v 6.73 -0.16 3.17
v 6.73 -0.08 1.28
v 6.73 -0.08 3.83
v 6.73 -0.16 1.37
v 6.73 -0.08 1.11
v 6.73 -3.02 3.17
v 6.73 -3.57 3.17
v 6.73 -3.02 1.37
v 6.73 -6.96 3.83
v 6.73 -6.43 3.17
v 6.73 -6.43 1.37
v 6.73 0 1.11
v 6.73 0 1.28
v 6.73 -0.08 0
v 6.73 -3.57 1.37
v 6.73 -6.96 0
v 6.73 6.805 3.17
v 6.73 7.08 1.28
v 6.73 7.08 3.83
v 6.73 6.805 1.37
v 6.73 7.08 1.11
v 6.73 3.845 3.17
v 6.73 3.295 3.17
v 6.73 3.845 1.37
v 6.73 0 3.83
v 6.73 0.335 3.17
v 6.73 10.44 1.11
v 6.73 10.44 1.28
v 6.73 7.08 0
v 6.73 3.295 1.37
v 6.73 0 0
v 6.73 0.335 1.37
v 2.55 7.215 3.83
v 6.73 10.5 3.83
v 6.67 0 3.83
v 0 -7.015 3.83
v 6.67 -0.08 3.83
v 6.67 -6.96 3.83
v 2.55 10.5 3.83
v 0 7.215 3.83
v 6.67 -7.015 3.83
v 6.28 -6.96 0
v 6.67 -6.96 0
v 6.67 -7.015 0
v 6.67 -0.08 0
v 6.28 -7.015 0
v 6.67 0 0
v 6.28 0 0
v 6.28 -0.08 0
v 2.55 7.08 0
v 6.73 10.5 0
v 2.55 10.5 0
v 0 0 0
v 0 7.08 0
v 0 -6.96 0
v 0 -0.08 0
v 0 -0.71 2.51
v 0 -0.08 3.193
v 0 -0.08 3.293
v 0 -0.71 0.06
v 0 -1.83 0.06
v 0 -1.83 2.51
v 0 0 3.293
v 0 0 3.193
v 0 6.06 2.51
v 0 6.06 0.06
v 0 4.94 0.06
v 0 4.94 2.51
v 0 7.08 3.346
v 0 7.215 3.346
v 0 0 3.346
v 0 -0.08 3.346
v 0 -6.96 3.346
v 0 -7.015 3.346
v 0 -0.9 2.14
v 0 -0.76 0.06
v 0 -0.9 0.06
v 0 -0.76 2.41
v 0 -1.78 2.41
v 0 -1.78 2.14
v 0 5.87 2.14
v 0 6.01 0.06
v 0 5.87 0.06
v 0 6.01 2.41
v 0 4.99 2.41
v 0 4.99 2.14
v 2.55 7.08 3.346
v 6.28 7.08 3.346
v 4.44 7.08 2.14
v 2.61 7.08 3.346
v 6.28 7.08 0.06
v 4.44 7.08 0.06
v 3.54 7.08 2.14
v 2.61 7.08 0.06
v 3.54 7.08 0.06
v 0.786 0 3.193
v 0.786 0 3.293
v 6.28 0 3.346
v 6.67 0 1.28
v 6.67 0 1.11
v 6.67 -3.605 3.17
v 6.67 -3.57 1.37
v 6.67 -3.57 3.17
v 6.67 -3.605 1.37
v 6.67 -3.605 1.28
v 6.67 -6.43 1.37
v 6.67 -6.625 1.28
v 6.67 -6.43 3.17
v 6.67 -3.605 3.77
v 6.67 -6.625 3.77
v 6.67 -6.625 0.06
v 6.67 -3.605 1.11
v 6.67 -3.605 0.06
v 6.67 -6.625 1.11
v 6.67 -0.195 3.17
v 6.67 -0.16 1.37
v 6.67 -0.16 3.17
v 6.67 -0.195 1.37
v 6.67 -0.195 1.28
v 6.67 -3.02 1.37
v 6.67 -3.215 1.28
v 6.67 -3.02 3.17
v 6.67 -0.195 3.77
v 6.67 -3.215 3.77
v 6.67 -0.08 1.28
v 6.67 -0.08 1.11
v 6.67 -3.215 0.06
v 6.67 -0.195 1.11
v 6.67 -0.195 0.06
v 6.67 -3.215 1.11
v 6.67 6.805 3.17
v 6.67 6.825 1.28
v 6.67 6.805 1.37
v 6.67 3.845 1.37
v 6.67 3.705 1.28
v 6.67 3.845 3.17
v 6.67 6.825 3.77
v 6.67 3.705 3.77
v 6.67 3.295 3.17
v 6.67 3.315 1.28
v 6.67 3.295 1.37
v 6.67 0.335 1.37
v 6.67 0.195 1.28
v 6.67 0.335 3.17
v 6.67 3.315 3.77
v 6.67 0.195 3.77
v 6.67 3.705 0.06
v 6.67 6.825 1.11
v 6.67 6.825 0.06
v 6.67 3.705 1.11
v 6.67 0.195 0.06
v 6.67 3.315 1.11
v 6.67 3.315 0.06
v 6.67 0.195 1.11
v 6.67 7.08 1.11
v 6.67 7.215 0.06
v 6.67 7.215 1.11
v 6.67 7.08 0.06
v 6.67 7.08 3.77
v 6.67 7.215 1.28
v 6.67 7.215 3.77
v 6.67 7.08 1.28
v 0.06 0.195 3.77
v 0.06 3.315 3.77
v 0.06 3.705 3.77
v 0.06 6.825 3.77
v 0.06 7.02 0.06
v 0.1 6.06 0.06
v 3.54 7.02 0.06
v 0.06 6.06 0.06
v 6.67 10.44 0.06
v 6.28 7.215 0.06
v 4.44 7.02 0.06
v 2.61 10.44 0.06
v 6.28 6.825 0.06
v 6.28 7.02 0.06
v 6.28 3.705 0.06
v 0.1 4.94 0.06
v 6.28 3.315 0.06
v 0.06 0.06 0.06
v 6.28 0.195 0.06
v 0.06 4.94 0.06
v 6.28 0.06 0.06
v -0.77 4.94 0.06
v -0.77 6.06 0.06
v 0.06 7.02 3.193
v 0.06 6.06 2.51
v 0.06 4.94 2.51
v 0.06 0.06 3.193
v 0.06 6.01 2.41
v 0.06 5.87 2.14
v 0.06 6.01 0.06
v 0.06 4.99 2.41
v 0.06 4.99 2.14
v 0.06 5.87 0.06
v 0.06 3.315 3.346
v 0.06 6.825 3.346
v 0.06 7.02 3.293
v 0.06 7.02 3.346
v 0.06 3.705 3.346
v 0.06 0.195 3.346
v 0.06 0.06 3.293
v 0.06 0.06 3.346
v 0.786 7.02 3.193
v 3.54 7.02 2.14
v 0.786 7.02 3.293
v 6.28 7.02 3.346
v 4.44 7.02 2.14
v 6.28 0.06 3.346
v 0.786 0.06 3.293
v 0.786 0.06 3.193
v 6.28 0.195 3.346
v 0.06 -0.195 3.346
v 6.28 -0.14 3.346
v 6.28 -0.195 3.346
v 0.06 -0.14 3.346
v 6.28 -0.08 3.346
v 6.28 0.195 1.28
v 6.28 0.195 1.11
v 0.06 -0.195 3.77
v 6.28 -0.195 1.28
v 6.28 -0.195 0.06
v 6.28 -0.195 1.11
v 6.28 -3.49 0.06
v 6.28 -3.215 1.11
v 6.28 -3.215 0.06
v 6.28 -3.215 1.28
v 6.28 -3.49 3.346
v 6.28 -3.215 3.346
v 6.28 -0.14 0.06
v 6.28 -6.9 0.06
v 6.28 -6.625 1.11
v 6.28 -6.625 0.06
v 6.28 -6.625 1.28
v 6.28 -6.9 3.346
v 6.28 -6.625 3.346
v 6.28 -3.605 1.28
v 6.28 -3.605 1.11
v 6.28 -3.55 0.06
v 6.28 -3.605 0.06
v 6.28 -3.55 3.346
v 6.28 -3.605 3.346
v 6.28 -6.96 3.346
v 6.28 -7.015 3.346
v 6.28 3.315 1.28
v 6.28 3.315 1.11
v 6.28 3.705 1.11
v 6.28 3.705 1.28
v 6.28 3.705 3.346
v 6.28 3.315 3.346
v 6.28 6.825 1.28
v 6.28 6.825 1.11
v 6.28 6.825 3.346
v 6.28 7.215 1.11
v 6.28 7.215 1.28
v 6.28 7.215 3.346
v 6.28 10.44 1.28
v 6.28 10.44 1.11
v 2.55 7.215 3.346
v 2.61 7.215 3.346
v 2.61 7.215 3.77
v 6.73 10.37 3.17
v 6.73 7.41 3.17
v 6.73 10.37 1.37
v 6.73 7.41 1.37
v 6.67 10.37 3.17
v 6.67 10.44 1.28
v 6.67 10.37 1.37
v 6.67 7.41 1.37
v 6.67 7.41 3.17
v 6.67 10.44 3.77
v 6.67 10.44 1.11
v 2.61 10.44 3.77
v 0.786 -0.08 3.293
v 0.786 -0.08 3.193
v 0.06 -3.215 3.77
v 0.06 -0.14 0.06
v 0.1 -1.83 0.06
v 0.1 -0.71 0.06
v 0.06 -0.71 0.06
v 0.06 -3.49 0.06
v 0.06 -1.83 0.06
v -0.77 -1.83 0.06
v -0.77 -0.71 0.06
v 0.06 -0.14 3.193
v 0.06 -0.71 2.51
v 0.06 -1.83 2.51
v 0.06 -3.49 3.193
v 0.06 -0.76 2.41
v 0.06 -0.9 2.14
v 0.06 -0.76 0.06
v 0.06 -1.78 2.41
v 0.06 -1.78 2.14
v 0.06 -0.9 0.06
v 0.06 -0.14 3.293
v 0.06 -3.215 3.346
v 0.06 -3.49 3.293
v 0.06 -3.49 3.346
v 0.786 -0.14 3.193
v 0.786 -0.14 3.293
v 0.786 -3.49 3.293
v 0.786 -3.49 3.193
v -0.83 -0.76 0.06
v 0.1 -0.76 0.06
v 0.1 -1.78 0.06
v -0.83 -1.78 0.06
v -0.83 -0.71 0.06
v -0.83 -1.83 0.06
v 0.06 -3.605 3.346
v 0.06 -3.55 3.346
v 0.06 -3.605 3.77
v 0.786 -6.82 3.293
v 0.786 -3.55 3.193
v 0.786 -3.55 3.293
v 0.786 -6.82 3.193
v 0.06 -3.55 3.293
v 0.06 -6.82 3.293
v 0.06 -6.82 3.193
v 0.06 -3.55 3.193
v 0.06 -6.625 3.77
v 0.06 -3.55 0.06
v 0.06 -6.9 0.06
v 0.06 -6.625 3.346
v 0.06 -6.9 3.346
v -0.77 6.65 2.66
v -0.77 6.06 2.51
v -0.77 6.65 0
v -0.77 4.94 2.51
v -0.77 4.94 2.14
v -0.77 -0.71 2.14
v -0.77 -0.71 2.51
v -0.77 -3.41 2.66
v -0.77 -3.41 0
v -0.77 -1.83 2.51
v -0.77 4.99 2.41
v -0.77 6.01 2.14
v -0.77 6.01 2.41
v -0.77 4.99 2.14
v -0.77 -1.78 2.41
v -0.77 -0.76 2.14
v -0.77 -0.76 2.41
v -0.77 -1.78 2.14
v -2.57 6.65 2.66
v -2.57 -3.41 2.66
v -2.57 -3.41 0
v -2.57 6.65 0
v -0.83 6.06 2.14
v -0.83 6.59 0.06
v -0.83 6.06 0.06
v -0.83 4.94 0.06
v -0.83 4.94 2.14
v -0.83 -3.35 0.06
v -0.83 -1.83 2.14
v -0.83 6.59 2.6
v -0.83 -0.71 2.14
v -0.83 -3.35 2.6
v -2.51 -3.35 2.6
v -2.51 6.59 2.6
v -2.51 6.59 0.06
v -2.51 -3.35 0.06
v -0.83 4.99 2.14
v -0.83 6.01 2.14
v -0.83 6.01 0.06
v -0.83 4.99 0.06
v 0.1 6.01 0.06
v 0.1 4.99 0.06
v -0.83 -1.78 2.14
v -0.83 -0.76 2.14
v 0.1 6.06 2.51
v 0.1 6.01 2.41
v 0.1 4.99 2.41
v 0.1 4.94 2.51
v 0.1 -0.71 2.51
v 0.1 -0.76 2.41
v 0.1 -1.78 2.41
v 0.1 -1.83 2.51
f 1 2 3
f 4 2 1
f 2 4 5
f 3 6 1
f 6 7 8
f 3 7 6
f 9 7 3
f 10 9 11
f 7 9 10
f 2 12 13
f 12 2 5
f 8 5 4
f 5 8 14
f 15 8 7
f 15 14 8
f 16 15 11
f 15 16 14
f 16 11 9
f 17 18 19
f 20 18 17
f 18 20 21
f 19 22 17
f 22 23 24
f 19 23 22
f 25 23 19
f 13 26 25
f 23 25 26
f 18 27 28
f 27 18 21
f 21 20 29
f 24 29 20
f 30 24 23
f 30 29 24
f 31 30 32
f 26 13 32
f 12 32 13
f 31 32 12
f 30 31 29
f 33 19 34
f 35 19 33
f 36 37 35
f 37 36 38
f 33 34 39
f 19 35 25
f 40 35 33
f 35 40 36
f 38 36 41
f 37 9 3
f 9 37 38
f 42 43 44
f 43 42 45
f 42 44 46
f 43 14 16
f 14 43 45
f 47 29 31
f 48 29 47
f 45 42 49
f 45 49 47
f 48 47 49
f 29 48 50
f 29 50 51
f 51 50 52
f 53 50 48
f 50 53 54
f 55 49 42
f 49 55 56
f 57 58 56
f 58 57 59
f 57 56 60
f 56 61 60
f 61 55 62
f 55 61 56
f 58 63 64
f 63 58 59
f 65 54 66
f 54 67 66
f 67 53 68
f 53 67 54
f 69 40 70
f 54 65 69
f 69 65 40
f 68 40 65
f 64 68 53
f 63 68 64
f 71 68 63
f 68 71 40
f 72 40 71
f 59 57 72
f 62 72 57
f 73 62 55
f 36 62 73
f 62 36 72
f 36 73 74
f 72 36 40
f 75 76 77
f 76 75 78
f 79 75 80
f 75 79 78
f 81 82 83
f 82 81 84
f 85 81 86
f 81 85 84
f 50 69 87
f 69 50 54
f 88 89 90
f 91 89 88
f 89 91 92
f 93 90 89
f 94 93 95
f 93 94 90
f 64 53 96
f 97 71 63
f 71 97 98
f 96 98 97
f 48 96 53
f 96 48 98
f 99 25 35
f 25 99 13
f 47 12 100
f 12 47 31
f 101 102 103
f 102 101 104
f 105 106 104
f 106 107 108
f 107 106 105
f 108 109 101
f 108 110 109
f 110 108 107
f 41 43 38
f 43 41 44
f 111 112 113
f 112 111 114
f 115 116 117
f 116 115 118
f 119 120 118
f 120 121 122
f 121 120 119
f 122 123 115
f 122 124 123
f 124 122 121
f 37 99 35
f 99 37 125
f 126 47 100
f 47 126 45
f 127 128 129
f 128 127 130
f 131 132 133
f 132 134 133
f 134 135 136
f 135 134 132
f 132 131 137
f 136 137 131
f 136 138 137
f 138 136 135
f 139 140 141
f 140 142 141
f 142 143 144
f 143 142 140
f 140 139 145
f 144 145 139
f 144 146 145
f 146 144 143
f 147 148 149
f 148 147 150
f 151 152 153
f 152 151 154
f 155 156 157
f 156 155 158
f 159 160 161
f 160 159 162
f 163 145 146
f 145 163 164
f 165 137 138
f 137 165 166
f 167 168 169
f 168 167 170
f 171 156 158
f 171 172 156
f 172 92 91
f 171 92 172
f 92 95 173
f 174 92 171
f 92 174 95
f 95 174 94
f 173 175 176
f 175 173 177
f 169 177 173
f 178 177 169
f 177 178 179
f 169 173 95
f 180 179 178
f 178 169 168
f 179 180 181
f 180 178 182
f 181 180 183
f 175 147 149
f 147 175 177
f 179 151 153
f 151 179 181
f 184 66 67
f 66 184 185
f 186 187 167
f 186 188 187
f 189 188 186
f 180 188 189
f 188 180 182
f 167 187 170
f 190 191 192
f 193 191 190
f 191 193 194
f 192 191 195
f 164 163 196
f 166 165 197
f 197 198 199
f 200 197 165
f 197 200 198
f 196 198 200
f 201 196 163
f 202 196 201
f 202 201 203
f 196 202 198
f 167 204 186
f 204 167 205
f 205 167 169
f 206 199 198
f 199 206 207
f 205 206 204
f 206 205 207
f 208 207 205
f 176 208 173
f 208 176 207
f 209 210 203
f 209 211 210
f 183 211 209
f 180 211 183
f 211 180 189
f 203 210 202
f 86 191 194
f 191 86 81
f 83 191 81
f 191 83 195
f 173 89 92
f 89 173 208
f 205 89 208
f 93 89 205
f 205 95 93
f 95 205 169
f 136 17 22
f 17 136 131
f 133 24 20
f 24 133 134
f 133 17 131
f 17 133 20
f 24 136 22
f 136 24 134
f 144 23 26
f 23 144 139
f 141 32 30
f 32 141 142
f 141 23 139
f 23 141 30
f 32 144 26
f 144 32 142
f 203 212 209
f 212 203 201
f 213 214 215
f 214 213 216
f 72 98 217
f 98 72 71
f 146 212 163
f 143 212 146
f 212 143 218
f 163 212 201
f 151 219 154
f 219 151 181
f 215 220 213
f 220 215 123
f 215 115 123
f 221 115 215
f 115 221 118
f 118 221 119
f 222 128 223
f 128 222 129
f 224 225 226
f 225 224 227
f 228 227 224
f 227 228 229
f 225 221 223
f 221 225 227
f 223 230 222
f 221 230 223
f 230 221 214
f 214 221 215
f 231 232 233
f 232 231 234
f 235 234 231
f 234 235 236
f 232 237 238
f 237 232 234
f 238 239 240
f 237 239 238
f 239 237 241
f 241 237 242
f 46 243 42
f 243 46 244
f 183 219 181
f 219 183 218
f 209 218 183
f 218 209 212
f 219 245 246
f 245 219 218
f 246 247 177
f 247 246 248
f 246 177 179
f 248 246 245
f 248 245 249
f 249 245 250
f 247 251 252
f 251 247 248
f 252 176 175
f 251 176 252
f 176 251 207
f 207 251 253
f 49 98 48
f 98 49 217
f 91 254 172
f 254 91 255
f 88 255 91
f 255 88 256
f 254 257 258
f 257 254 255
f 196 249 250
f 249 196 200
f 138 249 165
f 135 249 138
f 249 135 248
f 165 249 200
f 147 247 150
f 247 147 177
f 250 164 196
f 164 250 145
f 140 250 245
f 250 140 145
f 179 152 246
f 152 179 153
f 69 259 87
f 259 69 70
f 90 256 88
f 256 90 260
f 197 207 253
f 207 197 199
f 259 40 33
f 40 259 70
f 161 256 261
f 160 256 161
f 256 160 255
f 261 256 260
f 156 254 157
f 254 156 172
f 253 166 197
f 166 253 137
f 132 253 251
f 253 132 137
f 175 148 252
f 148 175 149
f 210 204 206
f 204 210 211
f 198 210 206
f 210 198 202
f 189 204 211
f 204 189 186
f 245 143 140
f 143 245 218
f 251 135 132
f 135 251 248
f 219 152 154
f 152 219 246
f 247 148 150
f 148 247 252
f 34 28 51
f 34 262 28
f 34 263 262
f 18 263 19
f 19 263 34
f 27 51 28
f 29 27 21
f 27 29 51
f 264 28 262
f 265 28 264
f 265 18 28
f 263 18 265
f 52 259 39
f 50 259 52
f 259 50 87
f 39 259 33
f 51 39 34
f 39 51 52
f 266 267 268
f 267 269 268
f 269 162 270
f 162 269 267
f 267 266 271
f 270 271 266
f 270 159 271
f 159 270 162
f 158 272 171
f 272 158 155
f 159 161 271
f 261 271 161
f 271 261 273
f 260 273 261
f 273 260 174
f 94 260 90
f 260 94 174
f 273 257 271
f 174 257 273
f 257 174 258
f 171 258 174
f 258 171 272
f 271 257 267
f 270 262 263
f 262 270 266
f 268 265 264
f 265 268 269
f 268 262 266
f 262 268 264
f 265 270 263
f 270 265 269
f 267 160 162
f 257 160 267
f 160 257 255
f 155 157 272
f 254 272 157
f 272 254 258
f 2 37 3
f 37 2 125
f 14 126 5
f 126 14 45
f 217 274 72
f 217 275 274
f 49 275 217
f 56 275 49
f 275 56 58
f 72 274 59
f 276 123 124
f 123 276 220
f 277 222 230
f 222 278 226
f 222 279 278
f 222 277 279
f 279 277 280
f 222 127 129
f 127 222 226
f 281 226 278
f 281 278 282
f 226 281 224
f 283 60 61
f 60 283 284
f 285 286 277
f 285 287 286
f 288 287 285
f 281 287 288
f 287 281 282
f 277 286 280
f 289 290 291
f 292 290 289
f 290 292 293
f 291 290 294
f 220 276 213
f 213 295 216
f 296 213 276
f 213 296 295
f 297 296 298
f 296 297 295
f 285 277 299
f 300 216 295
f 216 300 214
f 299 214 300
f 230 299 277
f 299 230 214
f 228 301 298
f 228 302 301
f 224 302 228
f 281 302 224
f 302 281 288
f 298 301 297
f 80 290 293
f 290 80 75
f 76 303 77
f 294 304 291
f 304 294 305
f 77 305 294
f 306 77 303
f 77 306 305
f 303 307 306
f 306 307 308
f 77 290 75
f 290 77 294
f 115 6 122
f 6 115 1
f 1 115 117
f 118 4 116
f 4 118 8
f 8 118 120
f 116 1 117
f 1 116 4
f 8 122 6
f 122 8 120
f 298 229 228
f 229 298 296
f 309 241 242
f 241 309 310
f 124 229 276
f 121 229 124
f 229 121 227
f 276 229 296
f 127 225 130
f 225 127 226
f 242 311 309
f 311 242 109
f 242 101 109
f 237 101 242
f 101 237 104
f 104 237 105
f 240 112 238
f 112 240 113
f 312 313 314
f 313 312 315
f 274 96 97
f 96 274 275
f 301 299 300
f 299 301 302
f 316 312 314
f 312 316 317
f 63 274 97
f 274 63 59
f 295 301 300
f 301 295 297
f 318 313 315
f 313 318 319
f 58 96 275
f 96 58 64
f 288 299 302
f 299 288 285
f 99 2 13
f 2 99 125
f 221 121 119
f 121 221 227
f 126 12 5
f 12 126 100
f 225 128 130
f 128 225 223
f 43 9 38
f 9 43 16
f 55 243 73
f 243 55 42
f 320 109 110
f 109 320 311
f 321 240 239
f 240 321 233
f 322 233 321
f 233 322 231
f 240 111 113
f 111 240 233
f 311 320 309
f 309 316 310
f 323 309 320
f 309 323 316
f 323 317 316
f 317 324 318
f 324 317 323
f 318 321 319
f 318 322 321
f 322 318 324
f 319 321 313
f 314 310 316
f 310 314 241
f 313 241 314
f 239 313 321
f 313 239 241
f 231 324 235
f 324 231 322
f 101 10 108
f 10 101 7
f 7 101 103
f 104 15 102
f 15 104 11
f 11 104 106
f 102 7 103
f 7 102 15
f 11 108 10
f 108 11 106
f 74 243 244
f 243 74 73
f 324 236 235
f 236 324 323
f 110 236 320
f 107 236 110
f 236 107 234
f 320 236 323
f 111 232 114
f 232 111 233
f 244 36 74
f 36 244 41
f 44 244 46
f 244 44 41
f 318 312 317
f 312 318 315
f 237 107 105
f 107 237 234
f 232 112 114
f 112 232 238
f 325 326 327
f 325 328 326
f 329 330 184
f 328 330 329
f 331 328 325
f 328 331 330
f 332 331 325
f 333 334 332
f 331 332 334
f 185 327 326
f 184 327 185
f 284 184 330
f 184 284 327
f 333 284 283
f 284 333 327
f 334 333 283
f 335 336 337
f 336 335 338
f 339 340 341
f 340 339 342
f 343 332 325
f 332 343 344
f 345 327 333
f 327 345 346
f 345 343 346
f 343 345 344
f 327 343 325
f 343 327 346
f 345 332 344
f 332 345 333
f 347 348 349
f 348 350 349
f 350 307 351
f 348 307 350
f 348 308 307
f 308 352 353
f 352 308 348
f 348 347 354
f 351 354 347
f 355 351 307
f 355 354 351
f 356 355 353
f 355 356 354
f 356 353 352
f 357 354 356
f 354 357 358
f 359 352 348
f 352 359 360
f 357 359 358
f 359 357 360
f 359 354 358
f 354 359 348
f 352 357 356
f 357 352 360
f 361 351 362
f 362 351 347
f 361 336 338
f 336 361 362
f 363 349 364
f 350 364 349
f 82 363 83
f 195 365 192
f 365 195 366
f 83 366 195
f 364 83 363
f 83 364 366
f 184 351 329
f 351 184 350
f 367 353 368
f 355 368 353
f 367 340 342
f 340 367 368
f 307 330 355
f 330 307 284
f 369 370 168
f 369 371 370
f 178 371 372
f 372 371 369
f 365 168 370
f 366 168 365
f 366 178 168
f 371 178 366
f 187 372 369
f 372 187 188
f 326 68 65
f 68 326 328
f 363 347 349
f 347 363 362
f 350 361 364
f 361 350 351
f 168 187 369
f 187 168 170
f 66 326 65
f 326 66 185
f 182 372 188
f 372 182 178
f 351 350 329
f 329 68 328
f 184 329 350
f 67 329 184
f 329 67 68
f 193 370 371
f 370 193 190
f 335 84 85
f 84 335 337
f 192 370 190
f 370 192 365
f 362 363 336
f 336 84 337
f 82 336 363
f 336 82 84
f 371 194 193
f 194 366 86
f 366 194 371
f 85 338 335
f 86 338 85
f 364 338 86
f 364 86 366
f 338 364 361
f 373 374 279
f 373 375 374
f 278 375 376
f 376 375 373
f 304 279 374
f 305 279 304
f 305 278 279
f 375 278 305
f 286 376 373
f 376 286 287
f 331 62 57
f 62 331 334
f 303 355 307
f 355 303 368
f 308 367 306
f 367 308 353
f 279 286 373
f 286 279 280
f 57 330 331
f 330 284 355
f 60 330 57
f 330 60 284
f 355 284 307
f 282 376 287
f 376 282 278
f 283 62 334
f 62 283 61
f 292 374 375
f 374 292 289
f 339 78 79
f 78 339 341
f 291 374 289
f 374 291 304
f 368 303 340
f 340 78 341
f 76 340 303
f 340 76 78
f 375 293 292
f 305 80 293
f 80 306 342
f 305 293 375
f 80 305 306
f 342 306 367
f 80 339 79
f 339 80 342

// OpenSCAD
//$fn=100;
//include <MCAD\regular_shapes.scad>

					/////PARAMETERS\\\\\

//VISIBLE ROOMS AND OBJECTS:
ceilings = true;
doors = true;
v315 = true;
v317 = true;
v314 = true;
serverRoom = true;
hallway = true;
windowsill = true;
windows = true;

//GENERAL
wall_t = 0.06; 
ceiling_h = 3.77;
room_x_def = 6.67;
door_y = 0.9;
door_z = 2.08;

//V315
v315_x = room_x_def;
v315_y = 7.02;
v315_z = ceiling_h;
v315_dist_2_door = 0.96;

//V317
v317_x = 4.12;
v317_y = 3.42;
v317_z = ceiling_h;
v317_dist_2_door = 0.93;


//HALLWAY CONNECTION
con_x = 0.83;
con_y = 1.12;
con_z = 2.45;

//HALLWAY
hal_x = 1.74;
hal_y = 10;
hal_z = 2.60;

//V314
v314_x = room_x_def;
v314_y = 3.41;
v314_z = ceiling_h;
v314_dist_2_door_hallway = 1.52;
v314_dist_2_door_server = 0.25;

//SERVER ROOM
serv_x = room_x_def;
serv_y = 3.41;
serv_z = ceiling_h;

//BEAMS
beam_x = v315_x;
beam_y = 0.39;
beam_z = 0.484;

//WINDOWSILL
windowsill_x = beam_y+0.06;
windowsill_h = 1.11;
windowsill_z = 0.17;

//WINDOW
window_z = 1.8;
window_y = 2.96;
window_x = 0.5;
window_h = windowsill_h + windowsill_z + 0.09;

//CABLE TRACK
track_x = 0.786;
track_y = v315_y+v314_y+serv_y;
track_z = 0.1;
track_h = 3.193;

					 /////MODEL\\\\
if(v315)	v315();
if(v317)	v317();
if(v314)	v314();
if(serverRoom)	serverRoom();
if(hallway) hallway();


					/////MODULES\\\\\

module room(x,y,z){
	difference(){
    	cube([x+wall_t,y+wall_t,z+wall_t]);
			if(ceilings){
				translate([wall_t,wall_t,wall_t]) cube([x-wall_t,y-wall_t,z-wall_t]);
			}
			else{
				translate([wall_t,wall_t,wall_t]) cube([x-wall_t,y-wall_t,z+wall_t]);
			}
    	
	}
}

module connection(x,y,z){
	difference(){
    	translate([0,0,wall_t])cube([x,y,z]);
    	translate([-0.25,0.05,wall_t+0.0001])cube([x+0.5,y-0.1,z-0.1]);
	}
}

module beamCorner(){
	translate([0,0,ceiling_h-beam_z+wall_t])cube([beam_x,beam_y,beam_z]);
	translate([room_x_def-beam_y,0,0])cube([beam_y,beam_y,ceiling_h]);
}

module windowsill(y){
		translate([v315_x-beam_y,0,windowsill_h])cube([windowsill_x,y,windowsill_z]);
}

module window(y){
	translate([v315_x - wall_t/2,0,window_h])cube([window_x,y,window_z]);
}

module cableTrack(y){
	translate([0,0,track_h])cube([track_x,y,track_z]);
}

module v315(){
	difference(){
	    	room(v315_x,v315_y,v315_z);
			if(doors){
				//DOOR 2 HALLWAY
				translate([-wall_t/2,v315_y+wall_t/2-con_y-v315_dist_2_door,wall_t])cube([wall_t*2,door_y,door_z]);
				//DOOR 2 V317
				translate([v315_x-v317_x+v317_dist_2_door+wall_t,v315_y-wall_t/2,wall_t])cube([door_y,wall_t*2,door_z]);
			}

			if(windows){
				translate([0,v315_y/2+beam_y/2+0.14,0])window(window_y);
				translate([0,beam_y/2+0.14,0])window(window_y);
			}
	}
	cableTrack(v315_y);

	translate([0,-beam_y/2,0])beamCorner();
	translate([0,v315_y/2-beam_y/2,0]) beamCorner();
	translate([0,v315_y-beam_y/2,0])beamCorner();

	if(windowsill){
   		windowsill(v315_y);
	}
}

module v317(){
	difference(){
	   translate([v315_x-v317_x,v315_y,0])room(v317_x,v317_y,v317_z);
		if(doors){
			//DOOR 2 V315
			translate([v315_x-v317_x+v317_dist_2_door+wall_t,v315_y-wall_t/2,wall_t])cube([door_y,wall_t*2,door_z]);
		}

		if(windows){
			translate([0,v315_y+beam_y,0])window(window_y);
		}
	}
	if(windowsill){
		translate([0,v315_y,0])windowsill(v317_y);
	}

	
}

module v314(){
	difference(){
	   translate([0,-v315_y+v314_y+wall_t,0])room(v314_x,v314_y,v314_z);
		if(doors){
			//DOOR 2 HALLWAY
			translate([-wall_t/2,-v314_y+v314_dist_2_door_hallway+wall_t*1.5,wall_t+0.0001])cube([wall_t*2,door_y,door_z]);
			//DOOR 2 SERVER ROOM
			translate([v314_dist_2_door_server+wall_t,-v314_y-wall_t/2,wall_t])cube([door_y,wall_t*2,door_z]);
		}

		if(windows){
			translate([0,-v314_y+beam_y,0])window(window_y-0.1);
		}
	}

	translate([0,-v314_y,0])cableTrack(v314_y);
	
	translate([0,-beam_y/2,0])beamCorner();
	translate([0,-v314_y-beam_y/2,0])beamCorner();
	
	if(windowsill){
		translate([0,-v314_y,0])windowsill(v314_y);
	}
}

module serverRoom(){
	difference(){
	translate([0,-(v315_y+v314_y)+serv_y+wall_t,0])room(serv_x,serv_y,serv_z);
		if(doors){
			//DOOR 2 V314
			translate([v314_dist_2_door_server+wall_t,-v314_y-wall_t/2,wall_t])cube([door_y,wall_t*2,door_z]);
		}

		if(windows){
			translate([0,-v314_y-serv_y+beam_y,0])window(window_y-0.1);
		}
	}
	translate([0,-v314_y-serv_y,0])cableTrack(v314_y);

	translate([0,-v314_y-beam_y/2,0])beamCorner();
	translate([0,-v314_y*2-beam_y/2,0])beamCorner();

	if(windowsill){
		translate([0,-v314_y-serv_y,0])windowsill(v314_y);
	}
}

module hallway(){
	difference(){
		translate([-(hal_x+con_x),-v314_y,0])room(hal_x,hal_y,hal_z);
		translate([-(hal_x+con_x)+wall_t,v315_y-wall_t*2.5,wall_t])cube([hal_x-wall_t,wall_t*2,hal_z+wall_t]);

		if(doors){
			//DOOR V315
			translate([-con_x-wall_t/2,v315_y-con_y-v315_dist_2_door,wall_t+0.0001])cube([wall_t*2,con_y,door_z]);

			//DOOR V314
			translate([-con_x-wall_t/2,-v314_y+wall_t+v314_dist_2_door_hallway,wall_t+0.0001])cube([wall_t*2,con_y,door_z]);
		}
	}

	//HALLWAY CONNECTIONS
	//HALLWAY CONNECTION V315
	translate([-con_x,v315_y-con_y-v315_dist_2_door,0])connection(con_x+0.1,con_y,con_z);

	//HALLWAY CONNECTION V314
	translate([-con_x,-v314_y+wall_t+v314_dist_2_door_hallway,0])connection(con_x+0.1,con_y,con_z);
}
